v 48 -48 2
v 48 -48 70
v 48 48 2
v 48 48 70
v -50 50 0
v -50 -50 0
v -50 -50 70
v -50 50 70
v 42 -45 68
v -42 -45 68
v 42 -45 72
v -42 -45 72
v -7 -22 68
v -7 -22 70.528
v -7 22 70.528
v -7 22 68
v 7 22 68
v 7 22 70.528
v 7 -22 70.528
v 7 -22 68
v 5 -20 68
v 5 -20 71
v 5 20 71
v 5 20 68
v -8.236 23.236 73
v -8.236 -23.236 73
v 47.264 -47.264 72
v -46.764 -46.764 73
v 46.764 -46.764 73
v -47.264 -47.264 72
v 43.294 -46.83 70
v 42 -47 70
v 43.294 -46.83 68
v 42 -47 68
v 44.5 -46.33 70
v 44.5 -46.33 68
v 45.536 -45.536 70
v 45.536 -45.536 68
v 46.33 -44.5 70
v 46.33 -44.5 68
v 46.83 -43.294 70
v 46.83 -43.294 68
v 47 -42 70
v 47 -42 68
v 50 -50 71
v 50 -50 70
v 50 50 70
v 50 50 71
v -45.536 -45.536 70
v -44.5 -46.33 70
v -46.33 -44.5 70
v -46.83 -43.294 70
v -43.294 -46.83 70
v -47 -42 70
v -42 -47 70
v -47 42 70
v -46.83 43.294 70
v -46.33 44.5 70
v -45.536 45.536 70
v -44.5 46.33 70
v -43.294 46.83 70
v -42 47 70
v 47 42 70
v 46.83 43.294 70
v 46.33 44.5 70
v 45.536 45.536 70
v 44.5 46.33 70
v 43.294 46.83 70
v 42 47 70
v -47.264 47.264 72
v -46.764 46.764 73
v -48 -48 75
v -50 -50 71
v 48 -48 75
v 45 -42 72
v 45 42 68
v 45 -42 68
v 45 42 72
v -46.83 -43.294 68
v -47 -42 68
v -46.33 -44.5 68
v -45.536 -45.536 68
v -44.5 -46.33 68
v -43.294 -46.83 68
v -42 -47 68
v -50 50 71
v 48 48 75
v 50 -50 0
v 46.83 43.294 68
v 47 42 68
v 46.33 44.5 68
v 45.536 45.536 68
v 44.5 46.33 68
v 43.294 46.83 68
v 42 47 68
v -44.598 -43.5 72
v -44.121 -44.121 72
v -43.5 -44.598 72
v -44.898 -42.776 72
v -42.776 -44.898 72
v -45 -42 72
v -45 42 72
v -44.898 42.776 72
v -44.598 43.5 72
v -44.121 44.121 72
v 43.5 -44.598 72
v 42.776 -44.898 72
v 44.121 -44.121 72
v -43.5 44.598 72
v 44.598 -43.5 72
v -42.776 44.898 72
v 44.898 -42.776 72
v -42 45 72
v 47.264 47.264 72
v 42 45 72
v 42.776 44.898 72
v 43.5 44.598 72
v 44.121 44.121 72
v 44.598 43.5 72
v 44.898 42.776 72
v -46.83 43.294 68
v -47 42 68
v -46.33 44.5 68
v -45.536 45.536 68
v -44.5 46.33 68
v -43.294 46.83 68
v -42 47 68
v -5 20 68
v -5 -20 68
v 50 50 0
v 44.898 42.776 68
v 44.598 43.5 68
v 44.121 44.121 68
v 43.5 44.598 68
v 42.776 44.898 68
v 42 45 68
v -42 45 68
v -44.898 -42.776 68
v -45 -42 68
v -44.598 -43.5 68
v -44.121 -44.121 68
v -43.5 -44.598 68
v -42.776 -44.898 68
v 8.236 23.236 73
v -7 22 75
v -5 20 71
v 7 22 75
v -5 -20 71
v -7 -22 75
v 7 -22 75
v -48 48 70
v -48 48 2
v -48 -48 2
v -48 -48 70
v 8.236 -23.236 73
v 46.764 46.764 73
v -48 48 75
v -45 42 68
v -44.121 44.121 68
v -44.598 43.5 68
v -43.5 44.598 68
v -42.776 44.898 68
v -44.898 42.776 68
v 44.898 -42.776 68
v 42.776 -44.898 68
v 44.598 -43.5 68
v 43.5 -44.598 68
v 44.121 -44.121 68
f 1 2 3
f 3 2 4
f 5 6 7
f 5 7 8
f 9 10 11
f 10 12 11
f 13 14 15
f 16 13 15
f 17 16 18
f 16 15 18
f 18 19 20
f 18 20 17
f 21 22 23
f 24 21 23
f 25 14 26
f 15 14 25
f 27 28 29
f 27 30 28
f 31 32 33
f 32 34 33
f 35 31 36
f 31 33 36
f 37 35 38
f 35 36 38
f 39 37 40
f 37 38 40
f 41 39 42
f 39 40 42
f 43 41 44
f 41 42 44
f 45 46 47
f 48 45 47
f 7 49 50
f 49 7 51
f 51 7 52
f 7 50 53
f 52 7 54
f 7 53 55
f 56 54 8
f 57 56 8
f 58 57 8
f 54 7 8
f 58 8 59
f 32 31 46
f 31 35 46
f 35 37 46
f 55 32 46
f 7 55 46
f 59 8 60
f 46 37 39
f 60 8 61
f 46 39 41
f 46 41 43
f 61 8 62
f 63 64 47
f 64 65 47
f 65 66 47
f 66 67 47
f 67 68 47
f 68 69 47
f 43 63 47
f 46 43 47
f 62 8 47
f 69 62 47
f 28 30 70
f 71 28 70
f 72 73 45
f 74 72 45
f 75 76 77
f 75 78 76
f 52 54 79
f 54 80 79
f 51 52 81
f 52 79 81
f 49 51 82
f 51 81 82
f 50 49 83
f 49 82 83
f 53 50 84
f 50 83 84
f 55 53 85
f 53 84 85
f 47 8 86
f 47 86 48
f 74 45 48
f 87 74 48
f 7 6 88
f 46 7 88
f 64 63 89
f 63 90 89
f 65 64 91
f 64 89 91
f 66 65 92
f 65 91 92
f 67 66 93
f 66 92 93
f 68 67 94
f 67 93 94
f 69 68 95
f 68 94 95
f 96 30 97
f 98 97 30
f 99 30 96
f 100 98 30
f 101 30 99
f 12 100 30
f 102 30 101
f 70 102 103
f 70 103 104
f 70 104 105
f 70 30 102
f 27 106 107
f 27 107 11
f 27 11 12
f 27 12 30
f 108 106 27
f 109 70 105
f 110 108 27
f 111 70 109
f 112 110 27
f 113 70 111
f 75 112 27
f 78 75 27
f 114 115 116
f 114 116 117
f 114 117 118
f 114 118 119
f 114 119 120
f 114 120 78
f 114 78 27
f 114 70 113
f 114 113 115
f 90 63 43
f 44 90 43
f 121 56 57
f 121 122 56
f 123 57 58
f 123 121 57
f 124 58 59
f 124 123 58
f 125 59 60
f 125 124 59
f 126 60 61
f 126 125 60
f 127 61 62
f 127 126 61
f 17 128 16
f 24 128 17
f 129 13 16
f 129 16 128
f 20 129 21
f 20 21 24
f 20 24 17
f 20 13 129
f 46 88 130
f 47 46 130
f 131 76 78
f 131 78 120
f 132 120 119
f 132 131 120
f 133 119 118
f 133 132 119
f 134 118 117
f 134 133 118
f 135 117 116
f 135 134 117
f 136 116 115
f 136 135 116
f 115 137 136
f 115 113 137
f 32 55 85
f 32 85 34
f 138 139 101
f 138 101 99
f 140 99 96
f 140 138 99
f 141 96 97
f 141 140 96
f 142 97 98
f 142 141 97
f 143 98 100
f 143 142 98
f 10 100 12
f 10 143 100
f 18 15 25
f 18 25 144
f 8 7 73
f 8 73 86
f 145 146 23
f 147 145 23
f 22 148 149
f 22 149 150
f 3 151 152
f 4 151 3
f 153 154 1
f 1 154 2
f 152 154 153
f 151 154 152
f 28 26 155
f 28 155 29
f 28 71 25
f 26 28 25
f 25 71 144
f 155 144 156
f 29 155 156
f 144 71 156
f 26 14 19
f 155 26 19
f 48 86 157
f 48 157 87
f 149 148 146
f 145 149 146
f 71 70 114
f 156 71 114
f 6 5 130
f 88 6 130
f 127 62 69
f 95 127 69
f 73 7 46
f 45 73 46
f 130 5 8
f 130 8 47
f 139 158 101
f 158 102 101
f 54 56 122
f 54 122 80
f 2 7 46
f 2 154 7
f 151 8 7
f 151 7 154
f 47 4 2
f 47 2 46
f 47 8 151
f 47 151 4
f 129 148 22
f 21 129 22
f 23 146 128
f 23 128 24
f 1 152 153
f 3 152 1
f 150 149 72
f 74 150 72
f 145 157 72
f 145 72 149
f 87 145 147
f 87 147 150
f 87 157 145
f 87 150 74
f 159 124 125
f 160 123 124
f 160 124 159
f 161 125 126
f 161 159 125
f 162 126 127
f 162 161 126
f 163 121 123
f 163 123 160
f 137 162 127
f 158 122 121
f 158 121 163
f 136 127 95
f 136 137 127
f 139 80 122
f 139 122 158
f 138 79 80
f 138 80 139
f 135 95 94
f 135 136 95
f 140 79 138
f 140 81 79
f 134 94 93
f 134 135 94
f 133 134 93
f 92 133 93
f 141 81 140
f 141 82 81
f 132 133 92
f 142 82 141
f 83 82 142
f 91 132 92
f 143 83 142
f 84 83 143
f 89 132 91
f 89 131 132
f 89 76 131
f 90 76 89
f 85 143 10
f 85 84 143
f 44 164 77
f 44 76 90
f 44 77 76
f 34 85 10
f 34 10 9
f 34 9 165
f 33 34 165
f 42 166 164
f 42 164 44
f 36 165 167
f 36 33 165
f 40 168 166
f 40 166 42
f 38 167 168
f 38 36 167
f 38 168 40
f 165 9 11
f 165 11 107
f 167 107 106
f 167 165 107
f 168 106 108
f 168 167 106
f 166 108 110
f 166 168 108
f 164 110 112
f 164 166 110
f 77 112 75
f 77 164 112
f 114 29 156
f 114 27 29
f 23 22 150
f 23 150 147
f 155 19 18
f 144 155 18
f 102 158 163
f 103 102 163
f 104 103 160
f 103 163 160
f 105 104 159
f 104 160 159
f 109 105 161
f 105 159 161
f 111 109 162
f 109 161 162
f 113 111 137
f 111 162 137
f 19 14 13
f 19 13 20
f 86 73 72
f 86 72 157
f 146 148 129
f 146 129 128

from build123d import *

# Parameters (mm, degrees)
F0_W      = 100
F0_H      = 100
F1_DEPTH  = 70
F2_W      = 96
F2_H      = 96
F3_DEPTH  = 68
F4_W      = 100
F4_H      = 100
F5_DEPTH  = 5
F6_W      = 94
F6_H      = 94
F7_DEPTH  = 2
F8_W      = 10
F8_H      = 40
F9_DEPTH  = 25
F10_R     = 5
F11_SIZE2 = 4
F11_SIZE  = 2
F12_T     = -2


with BuildPart() as f1:
    # F0 (on Top) → F1 (new body)
    with BuildSketch(Plane.XY):
        Rectangle(F0_W, F0_H)
    extrude(amount=F1_DEPTH)

    # F2 (on face) → F3 (cut)
    with BuildSketch(Plane.XY.offset(70)):
        Rectangle(F2_W, F2_H)
    extrude(amount=-F3_DEPTH, mode=Mode.SUBTRACT)


with BuildPart() as f5:
    # F4 (on face) → F5 (new body)
    with BuildSketch(Plane.XY.offset(70)):
        Rectangle(F4_W, F4_H)
    extrude(amount=F5_DEPTH)

    # F6 (on face) → F7 (join)
    with BuildSketch(Plane(origin=(0, 0, 70), x_dir=(1, 0, 0), z_dir=(0, 0, -1))):
        Rectangle(F6_W, F6_H)
    extrude(amount=F7_DEPTH)

    # F8 (on face) → F9 (cut)
    with BuildSketch(Plane.XY.offset(75)):
        Rectangle(F8_W, F8_H)
    extrude(amount=-F9_DEPTH, mode=Mode.SUBTRACT)

    # F10
    f10_edges = [f5.edges().sort_by_distance(p)[0] for p in [
        (-47, -47, 69),
        (47, -47, 69),
        (-47, 47, 69),
        (47, 47, 69),
    ]]
    fillet(f10_edges, radius=F10_R)

    # F11
    f11_edges = [f5.edges().sort_by_distance(p)[0] for p in [
        (-50, 0, 75),
        (0, 50, 75),
        (0, -50, 75),
        (50, 0, 75),
        (0, -20, 75),
        (5, 0, 75),
        (0, 20, 75),
        (-5, 0, 75),
    ]]
    f11_side = f5.faces().sort_by_distance((-48.585786, 0, 75))[0]
    chamfer(f11_edges, length=F11_SIZE, length2=F11_SIZE2, reference=f11_side)

    # F12
    f12_openings = [f5.faces().sort_by_distance(p)[0] for p in [
        (0, -45.670639, 68),
    ]]
    offset(amount=F12_T, openings=f12_openings, kind=Kind.INTERSECTION)


solid = Compound([f1.part, f5.part])
